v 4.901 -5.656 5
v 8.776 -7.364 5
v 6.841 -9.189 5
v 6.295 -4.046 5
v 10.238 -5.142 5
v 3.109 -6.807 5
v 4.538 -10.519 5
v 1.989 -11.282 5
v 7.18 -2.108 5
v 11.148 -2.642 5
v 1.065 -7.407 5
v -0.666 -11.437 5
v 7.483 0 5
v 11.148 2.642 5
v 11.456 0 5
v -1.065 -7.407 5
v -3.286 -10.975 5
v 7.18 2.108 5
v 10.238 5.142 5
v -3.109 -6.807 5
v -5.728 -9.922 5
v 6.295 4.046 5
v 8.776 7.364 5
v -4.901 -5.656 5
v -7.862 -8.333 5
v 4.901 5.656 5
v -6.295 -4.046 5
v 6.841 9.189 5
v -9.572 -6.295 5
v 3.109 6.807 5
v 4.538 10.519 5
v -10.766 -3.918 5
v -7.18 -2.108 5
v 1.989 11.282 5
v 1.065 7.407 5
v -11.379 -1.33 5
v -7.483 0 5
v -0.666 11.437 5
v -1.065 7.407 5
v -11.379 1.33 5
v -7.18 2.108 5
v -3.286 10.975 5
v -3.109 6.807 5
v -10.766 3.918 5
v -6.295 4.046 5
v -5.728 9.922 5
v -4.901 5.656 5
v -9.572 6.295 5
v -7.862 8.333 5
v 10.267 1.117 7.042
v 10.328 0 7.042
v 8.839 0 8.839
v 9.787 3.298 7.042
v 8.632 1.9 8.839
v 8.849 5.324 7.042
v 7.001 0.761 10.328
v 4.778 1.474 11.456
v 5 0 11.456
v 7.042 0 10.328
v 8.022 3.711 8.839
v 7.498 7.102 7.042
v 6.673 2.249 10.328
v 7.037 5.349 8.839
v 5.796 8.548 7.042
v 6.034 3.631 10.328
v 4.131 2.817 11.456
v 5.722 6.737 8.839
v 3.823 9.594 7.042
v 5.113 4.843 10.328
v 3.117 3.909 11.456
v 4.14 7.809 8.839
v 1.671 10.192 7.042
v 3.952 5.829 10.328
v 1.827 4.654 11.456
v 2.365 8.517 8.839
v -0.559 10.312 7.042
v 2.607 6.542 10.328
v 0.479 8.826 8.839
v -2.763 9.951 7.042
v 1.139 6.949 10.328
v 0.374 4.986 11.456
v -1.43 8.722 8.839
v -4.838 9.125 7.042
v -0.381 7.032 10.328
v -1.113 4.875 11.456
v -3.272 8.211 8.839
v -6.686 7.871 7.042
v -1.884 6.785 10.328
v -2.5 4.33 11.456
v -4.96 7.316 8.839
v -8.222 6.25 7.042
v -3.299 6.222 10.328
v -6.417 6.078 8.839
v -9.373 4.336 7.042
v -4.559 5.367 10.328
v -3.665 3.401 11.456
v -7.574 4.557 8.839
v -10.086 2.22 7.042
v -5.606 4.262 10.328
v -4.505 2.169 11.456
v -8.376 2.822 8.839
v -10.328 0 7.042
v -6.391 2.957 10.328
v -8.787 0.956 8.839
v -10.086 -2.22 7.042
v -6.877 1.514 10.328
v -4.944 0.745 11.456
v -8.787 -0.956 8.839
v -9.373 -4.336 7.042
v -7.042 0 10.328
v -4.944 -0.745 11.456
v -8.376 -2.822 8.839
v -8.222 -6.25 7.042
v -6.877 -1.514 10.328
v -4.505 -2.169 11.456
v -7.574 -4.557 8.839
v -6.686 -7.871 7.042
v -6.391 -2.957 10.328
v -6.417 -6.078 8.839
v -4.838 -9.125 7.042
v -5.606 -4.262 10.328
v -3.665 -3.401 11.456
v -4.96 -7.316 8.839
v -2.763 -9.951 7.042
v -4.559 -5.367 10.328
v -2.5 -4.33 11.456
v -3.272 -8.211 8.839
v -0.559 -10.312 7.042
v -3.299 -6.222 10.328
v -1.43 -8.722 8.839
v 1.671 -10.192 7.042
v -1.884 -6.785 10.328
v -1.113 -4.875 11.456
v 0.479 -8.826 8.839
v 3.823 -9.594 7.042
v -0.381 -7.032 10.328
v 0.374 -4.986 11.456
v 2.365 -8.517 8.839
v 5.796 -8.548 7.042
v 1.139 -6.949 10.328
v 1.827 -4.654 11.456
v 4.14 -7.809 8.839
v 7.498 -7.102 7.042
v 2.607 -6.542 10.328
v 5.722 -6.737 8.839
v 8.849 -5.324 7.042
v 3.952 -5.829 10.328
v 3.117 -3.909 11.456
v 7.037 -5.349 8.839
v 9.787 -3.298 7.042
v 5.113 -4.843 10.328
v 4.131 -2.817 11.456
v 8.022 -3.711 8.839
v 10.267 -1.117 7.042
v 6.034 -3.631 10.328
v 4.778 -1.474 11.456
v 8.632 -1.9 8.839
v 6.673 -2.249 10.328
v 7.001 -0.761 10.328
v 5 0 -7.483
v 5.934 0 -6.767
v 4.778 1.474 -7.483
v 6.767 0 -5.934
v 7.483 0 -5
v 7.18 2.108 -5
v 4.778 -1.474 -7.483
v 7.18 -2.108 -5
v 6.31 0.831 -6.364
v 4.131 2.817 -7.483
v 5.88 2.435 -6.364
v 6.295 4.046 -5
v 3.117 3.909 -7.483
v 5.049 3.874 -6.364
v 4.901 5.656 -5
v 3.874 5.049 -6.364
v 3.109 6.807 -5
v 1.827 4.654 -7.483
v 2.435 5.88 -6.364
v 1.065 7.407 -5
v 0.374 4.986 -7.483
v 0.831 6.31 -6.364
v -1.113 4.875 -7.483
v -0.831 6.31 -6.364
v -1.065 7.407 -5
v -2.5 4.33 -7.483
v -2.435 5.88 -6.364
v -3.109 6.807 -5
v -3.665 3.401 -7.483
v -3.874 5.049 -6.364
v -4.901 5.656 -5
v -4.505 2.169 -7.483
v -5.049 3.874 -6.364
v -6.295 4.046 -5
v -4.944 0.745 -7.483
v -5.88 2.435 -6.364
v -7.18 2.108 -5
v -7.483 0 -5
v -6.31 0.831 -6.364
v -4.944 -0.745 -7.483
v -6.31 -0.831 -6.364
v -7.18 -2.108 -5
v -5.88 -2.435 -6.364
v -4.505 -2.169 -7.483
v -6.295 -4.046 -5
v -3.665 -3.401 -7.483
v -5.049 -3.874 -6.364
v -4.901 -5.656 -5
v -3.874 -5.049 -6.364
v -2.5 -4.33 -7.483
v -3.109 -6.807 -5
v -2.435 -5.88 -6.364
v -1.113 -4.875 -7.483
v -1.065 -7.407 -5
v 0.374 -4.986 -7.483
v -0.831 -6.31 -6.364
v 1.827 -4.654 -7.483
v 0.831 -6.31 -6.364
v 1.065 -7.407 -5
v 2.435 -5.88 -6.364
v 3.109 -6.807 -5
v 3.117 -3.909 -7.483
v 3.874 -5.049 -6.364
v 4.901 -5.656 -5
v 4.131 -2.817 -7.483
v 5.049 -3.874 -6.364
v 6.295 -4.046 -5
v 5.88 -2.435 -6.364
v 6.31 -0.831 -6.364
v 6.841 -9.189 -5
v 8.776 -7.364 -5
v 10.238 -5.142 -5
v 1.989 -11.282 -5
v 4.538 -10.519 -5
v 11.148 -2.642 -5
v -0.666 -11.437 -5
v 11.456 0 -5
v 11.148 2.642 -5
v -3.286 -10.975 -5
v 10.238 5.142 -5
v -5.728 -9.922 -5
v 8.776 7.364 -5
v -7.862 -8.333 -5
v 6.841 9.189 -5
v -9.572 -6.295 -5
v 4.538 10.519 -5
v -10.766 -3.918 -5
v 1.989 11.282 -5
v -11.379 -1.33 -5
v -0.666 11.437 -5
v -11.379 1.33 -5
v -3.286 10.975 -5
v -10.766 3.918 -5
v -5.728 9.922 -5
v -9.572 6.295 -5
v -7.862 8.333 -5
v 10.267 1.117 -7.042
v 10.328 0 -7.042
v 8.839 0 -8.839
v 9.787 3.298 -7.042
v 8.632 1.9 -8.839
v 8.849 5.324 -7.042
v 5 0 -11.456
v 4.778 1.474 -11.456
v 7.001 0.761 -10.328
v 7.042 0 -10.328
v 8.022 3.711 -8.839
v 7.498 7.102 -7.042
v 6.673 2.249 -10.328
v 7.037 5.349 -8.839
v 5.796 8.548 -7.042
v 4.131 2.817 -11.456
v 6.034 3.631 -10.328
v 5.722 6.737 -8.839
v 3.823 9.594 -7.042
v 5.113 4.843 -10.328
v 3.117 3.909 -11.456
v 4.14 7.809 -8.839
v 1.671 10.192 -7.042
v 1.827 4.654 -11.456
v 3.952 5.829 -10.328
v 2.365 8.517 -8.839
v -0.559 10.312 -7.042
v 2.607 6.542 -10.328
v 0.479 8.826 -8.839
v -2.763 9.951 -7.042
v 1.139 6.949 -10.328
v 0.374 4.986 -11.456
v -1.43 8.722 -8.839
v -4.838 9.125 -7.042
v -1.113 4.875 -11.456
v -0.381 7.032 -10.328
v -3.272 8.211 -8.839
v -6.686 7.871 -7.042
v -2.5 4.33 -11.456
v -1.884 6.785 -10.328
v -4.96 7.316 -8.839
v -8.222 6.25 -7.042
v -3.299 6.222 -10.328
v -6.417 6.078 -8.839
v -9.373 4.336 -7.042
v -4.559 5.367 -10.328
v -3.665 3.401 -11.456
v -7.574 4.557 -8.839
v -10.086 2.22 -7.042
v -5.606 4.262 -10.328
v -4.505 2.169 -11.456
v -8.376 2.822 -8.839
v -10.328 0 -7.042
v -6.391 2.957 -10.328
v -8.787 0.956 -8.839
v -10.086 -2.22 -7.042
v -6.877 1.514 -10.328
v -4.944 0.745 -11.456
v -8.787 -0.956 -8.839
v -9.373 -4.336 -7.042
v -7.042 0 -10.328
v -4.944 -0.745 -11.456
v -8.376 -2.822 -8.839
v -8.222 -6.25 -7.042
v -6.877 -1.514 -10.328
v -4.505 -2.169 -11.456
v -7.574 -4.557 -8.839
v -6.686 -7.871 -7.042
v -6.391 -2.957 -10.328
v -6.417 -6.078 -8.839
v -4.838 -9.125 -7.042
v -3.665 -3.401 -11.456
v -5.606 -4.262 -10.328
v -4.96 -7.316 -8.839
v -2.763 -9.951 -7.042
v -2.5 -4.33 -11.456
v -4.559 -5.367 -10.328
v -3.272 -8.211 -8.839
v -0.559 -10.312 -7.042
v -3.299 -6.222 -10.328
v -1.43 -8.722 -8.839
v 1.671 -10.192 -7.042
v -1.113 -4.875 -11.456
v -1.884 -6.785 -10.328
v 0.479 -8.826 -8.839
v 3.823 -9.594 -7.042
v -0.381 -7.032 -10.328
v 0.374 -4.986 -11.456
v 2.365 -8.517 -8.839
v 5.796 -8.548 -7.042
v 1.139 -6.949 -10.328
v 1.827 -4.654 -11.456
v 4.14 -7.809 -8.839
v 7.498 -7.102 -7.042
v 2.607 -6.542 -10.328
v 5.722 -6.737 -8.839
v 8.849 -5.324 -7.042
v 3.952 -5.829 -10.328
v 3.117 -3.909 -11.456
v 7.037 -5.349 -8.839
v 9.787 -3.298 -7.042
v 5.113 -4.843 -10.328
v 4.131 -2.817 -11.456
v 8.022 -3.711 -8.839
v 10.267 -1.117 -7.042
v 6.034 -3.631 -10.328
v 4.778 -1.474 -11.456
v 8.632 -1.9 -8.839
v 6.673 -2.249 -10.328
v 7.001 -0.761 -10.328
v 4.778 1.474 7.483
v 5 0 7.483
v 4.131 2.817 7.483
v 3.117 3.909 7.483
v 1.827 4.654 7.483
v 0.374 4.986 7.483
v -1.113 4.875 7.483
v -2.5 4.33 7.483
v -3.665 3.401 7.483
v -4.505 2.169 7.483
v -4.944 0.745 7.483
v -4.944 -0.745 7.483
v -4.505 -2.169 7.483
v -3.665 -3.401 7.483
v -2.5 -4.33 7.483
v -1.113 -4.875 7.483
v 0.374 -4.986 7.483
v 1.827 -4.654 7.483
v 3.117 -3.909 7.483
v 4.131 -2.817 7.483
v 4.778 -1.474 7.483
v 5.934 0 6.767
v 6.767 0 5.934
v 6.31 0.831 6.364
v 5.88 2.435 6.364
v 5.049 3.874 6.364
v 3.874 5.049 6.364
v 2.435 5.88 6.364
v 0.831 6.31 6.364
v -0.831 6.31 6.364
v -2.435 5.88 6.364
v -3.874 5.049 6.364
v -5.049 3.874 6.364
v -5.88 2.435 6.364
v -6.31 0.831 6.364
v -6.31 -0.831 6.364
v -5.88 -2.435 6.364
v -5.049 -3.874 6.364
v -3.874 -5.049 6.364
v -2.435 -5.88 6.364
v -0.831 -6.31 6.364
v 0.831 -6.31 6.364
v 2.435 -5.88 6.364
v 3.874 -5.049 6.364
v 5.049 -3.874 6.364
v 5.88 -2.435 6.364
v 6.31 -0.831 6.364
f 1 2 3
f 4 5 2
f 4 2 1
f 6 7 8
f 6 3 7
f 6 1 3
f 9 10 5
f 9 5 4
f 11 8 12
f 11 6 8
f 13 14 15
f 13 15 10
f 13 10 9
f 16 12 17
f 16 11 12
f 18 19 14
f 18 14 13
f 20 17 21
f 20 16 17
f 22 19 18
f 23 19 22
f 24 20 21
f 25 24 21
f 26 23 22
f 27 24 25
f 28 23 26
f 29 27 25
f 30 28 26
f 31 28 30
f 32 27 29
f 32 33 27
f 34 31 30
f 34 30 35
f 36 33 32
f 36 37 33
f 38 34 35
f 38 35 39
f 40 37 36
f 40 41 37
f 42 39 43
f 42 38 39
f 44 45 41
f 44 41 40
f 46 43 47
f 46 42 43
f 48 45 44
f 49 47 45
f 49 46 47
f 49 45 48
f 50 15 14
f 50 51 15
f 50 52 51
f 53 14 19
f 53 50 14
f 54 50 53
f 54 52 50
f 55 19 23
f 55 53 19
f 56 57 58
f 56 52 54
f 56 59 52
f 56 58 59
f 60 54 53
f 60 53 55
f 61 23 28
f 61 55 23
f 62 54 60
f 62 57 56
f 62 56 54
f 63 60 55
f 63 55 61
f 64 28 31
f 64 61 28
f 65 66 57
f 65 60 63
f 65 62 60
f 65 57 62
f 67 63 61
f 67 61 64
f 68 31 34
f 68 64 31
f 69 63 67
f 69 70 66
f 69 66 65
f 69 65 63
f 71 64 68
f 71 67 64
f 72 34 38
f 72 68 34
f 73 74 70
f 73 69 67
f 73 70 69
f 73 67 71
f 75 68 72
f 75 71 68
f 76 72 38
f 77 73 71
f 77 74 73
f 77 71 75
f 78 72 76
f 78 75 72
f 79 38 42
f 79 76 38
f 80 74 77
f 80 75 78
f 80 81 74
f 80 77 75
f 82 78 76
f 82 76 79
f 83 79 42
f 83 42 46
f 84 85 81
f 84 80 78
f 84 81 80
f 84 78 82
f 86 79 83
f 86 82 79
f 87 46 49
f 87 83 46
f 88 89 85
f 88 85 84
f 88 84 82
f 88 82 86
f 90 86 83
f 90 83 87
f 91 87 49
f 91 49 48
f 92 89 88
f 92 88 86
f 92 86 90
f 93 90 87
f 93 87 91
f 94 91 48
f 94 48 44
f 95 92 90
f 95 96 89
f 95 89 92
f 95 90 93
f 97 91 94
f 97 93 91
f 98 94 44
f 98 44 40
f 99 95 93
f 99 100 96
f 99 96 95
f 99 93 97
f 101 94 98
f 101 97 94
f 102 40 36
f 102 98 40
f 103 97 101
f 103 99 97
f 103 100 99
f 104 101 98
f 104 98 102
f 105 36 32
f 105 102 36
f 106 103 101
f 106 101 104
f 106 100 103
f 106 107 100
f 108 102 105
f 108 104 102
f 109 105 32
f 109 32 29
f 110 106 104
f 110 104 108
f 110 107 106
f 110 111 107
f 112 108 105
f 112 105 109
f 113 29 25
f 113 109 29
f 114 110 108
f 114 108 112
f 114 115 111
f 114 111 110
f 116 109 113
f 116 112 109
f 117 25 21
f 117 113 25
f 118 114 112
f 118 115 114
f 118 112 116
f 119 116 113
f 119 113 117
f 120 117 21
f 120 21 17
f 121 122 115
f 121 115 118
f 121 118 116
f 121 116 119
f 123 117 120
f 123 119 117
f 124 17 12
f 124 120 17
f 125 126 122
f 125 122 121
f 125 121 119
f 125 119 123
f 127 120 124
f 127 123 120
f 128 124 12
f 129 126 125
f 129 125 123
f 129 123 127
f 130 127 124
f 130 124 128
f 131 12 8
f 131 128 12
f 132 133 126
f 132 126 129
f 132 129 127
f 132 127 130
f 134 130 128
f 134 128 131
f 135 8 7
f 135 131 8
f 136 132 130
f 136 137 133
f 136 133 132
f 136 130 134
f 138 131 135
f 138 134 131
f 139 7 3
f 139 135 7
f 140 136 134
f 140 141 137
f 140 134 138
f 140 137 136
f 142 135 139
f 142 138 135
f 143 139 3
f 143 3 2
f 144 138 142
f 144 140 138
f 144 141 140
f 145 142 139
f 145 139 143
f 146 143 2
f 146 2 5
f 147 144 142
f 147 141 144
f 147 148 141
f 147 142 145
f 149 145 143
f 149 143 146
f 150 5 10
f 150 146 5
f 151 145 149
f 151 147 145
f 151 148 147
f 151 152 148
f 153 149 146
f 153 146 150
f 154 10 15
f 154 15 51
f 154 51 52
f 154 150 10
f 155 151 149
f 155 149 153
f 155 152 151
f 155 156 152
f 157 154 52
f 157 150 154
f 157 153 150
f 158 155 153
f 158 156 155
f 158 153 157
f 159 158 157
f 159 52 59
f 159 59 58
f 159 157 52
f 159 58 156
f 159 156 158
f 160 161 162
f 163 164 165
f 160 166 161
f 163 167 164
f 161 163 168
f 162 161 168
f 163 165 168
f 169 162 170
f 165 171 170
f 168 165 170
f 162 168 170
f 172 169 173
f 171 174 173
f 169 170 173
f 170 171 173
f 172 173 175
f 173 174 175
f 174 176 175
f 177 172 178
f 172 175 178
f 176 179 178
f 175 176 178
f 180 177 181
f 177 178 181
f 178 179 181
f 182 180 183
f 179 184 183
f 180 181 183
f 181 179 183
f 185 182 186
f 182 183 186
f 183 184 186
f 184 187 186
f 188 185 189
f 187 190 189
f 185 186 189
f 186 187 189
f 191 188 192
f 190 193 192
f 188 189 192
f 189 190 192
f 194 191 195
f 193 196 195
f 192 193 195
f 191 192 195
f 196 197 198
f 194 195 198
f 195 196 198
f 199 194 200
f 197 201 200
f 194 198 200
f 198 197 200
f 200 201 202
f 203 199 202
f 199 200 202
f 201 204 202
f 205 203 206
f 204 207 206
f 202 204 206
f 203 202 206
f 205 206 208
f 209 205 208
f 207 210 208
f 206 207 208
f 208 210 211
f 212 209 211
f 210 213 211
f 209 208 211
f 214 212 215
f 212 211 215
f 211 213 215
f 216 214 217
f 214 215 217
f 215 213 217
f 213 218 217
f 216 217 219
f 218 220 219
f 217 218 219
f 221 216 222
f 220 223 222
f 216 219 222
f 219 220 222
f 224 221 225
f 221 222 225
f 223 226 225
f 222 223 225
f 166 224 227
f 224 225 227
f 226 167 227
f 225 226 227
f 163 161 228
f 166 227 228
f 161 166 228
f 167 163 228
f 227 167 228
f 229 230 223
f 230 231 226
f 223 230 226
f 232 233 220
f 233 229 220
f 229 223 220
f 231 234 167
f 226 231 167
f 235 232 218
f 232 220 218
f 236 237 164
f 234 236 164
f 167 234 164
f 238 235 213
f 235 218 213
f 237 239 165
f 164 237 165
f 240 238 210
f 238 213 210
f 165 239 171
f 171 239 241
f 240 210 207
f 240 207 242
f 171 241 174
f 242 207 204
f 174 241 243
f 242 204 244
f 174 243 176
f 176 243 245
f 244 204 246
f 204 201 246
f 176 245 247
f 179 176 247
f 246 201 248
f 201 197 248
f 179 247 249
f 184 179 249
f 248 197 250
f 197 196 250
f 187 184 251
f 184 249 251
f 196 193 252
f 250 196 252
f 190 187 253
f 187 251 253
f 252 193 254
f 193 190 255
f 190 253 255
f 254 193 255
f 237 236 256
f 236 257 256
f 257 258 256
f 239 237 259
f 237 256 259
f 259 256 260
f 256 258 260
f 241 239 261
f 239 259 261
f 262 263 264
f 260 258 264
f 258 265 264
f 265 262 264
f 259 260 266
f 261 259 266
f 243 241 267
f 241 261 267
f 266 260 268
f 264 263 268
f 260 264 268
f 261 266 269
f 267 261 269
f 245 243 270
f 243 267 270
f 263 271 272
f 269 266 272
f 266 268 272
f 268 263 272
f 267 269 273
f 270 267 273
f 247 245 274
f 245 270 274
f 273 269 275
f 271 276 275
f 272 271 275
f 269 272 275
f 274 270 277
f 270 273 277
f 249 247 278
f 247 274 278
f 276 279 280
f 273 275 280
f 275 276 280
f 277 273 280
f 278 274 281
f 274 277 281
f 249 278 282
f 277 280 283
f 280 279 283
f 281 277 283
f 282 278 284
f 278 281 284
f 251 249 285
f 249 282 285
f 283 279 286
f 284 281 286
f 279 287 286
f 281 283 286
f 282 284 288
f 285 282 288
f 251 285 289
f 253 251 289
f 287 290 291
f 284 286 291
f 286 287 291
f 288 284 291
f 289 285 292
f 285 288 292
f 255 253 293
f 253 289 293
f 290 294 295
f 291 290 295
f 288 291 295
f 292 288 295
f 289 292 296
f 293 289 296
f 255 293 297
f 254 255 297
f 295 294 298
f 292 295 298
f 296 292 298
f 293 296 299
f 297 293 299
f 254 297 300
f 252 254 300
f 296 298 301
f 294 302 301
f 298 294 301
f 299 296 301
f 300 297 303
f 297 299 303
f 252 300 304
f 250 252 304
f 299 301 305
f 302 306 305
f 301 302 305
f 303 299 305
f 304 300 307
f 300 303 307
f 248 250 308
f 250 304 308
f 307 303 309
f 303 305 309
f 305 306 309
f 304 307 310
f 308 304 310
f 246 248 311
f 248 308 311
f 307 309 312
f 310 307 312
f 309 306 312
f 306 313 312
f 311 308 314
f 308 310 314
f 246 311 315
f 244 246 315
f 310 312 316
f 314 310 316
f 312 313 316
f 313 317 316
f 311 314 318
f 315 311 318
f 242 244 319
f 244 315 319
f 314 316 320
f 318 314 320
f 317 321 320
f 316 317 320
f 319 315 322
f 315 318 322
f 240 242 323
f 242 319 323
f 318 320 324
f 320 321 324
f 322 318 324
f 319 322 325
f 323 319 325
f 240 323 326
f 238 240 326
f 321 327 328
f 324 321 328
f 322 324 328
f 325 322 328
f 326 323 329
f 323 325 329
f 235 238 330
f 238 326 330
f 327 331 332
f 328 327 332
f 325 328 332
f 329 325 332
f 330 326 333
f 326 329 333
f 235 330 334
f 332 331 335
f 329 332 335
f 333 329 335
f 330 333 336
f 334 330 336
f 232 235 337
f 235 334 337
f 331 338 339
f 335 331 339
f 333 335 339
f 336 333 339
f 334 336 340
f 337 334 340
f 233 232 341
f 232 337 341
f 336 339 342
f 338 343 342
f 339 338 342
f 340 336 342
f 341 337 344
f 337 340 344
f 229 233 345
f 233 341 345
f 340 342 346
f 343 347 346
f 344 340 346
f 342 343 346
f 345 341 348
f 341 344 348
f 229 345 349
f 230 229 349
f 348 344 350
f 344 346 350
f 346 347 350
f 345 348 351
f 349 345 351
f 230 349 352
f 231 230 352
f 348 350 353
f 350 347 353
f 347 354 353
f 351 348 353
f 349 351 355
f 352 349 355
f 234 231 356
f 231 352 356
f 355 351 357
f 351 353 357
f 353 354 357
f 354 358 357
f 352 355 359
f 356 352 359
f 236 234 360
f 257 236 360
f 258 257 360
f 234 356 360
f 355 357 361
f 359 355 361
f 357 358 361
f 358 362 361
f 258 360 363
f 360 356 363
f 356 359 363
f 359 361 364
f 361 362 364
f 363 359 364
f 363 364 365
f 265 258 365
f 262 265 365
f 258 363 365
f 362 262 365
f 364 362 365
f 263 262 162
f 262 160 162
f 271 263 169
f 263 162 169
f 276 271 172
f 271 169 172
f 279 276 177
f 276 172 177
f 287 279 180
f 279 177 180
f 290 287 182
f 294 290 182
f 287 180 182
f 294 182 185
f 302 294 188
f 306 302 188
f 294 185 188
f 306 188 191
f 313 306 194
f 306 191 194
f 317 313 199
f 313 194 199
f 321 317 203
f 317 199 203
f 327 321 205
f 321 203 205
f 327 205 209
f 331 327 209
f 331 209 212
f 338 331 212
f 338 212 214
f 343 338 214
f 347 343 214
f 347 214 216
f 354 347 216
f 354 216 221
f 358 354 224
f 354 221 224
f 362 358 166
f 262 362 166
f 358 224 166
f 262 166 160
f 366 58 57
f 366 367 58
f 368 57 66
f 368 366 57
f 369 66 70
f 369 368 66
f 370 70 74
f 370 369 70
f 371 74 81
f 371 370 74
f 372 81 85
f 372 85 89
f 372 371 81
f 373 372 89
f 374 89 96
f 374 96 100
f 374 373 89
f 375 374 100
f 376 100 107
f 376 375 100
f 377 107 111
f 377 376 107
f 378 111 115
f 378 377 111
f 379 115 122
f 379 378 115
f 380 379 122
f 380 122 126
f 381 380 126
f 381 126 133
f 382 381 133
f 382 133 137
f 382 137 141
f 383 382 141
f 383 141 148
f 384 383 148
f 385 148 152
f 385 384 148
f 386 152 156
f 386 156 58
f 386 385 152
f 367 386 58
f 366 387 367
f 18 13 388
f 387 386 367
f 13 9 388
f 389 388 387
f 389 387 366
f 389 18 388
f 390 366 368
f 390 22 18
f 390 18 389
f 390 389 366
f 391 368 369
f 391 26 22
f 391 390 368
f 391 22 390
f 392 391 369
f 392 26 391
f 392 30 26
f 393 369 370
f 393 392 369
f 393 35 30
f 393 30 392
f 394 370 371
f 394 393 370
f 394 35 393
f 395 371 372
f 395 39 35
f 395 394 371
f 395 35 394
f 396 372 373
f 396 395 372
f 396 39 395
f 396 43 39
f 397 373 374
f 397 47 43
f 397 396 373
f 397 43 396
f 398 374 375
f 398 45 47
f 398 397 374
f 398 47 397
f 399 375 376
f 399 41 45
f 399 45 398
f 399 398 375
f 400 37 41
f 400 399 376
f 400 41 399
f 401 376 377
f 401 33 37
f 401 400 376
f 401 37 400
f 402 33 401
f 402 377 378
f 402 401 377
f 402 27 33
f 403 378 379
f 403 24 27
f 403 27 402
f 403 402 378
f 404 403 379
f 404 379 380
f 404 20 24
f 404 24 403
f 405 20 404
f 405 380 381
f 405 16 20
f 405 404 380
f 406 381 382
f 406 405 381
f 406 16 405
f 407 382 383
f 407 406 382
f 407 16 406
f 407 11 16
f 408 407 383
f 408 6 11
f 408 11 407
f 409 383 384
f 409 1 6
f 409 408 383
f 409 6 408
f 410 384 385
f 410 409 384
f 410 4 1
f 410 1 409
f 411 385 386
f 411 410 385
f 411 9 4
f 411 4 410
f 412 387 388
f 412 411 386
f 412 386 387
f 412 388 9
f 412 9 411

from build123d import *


with BuildPart() as part:
    # Sketch1 → Revolve1 (revolve)
    with BuildSketch(Plane(origin=(0, 0, 0), x_dir=(1, 0, 0), z_dir=(0, 1, 0))):
        with BuildLine():
            ThreePointArc((5, -7.483314774), (6.363961031, -6.363961031), (7.483314774, -5))
            Line((7.483314774, -5), (11.456439237, -5))
            ThreePointArc((11.456439237, -5), (8.838834765, -8.838834765), (5, -11.456439237))
            Line((5, -11.456439237), (5, -7.483314774))
        make_face()
        with BuildLine():
            Line((7.483314774, 5), (11.456439237, 5))
            ThreePointArc((11.456439237, 5), (8.838834765, 8.838834765), (5, 11.456439237))
            Line((5, 11.456439237), (5, 7.483314774))
            ThreePointArc((5, 7.483314774), (6.363961031, 6.363961031), (7.483314774, 5))
        make_face()
    revolve(axis=Axis((0, 0, -14.515186916), (0, 0, 1)))


solid = part.part
